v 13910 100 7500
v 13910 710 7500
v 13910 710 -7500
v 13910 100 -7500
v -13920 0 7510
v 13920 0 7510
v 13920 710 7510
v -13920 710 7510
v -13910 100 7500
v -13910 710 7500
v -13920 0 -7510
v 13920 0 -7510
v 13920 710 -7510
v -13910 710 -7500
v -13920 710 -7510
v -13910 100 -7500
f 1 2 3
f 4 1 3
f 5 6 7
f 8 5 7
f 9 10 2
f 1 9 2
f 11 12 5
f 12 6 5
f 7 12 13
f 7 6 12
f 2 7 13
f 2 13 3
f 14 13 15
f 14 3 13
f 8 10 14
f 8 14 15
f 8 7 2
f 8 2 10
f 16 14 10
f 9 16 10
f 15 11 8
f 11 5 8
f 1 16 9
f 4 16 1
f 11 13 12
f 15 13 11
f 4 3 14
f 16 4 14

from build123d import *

# Parameters (mm, degrees)
SKETCH_1_W      = 27820
SKETCH_1_H      = 15000
EXTRUDE_1_DEPTH = 100
SKETCH_3_W      = 15000
SKETCH_3_H      = 710
EXTRUDE_2_DEPTH = 10
SKETCH_4_W      = 27830
SKETCH_4_H      = 710
EXTRUDE_3_DEPTH = 10
SKETCH_5_W      = 15010
SKETCH_5_H      = 710
EXTRUDE_4_DEPTH = 10
SKETCH_7_W      = 27840
SKETCH_7_H      = 710
EXTRUDE_6_DEPTH = 10


with BuildPart() as part:
    # 草图1 → 凸台-拉伸1 (new body)
    with BuildSketch(Plane(origin=(0, 0, 0), x_dir=(1, 0, 0), z_dir=(0, 1, 0))):
        Rectangle(SKETCH_1_W, SKETCH_1_H)
    extrude(amount=EXTRUDE_1_DEPTH)

    # 草图3 → 凸台-拉伸2 (add)
    with BuildSketch(Plane.ZY.offset(13910)):
        with Locations((0, 355)):
            Rectangle(SKETCH_3_W, SKETCH_3_H)
    extrude(amount=EXTRUDE_2_DEPTH)

    # 草图4 → 凸台-拉伸3 (add)
    with BuildSketch(Plane.XY.offset(7500)):
        with Locations((-5, 355)):
            Rectangle(SKETCH_4_W, SKETCH_4_H)
    extrude(amount=EXTRUDE_3_DEPTH)

    # 草图5 → 凸台-拉伸4 (add)
    with BuildSketch(Plane(origin=(13910, 0, 0), x_dir=(0, 0, -1), z_dir=(1, 0, 0))):
        with Locations((-5, 355)):
            Rectangle(SKETCH_5_W, SKETCH_5_H)
    extrude(amount=EXTRUDE_4_DEPTH)

    # 草图7 → 凸台-拉伸6 (add)
    with BuildSketch(Plane(origin=(0, 0, -7500), x_dir=(-1, 0, 0), z_dir=(0, 0, -1))):
        with Locations((0, 355)):
            Rectangle(SKETCH_7_W, SKETCH_7_H)
    extrude(amount=EXTRUDE_6_DEPTH)


solid = part.part
